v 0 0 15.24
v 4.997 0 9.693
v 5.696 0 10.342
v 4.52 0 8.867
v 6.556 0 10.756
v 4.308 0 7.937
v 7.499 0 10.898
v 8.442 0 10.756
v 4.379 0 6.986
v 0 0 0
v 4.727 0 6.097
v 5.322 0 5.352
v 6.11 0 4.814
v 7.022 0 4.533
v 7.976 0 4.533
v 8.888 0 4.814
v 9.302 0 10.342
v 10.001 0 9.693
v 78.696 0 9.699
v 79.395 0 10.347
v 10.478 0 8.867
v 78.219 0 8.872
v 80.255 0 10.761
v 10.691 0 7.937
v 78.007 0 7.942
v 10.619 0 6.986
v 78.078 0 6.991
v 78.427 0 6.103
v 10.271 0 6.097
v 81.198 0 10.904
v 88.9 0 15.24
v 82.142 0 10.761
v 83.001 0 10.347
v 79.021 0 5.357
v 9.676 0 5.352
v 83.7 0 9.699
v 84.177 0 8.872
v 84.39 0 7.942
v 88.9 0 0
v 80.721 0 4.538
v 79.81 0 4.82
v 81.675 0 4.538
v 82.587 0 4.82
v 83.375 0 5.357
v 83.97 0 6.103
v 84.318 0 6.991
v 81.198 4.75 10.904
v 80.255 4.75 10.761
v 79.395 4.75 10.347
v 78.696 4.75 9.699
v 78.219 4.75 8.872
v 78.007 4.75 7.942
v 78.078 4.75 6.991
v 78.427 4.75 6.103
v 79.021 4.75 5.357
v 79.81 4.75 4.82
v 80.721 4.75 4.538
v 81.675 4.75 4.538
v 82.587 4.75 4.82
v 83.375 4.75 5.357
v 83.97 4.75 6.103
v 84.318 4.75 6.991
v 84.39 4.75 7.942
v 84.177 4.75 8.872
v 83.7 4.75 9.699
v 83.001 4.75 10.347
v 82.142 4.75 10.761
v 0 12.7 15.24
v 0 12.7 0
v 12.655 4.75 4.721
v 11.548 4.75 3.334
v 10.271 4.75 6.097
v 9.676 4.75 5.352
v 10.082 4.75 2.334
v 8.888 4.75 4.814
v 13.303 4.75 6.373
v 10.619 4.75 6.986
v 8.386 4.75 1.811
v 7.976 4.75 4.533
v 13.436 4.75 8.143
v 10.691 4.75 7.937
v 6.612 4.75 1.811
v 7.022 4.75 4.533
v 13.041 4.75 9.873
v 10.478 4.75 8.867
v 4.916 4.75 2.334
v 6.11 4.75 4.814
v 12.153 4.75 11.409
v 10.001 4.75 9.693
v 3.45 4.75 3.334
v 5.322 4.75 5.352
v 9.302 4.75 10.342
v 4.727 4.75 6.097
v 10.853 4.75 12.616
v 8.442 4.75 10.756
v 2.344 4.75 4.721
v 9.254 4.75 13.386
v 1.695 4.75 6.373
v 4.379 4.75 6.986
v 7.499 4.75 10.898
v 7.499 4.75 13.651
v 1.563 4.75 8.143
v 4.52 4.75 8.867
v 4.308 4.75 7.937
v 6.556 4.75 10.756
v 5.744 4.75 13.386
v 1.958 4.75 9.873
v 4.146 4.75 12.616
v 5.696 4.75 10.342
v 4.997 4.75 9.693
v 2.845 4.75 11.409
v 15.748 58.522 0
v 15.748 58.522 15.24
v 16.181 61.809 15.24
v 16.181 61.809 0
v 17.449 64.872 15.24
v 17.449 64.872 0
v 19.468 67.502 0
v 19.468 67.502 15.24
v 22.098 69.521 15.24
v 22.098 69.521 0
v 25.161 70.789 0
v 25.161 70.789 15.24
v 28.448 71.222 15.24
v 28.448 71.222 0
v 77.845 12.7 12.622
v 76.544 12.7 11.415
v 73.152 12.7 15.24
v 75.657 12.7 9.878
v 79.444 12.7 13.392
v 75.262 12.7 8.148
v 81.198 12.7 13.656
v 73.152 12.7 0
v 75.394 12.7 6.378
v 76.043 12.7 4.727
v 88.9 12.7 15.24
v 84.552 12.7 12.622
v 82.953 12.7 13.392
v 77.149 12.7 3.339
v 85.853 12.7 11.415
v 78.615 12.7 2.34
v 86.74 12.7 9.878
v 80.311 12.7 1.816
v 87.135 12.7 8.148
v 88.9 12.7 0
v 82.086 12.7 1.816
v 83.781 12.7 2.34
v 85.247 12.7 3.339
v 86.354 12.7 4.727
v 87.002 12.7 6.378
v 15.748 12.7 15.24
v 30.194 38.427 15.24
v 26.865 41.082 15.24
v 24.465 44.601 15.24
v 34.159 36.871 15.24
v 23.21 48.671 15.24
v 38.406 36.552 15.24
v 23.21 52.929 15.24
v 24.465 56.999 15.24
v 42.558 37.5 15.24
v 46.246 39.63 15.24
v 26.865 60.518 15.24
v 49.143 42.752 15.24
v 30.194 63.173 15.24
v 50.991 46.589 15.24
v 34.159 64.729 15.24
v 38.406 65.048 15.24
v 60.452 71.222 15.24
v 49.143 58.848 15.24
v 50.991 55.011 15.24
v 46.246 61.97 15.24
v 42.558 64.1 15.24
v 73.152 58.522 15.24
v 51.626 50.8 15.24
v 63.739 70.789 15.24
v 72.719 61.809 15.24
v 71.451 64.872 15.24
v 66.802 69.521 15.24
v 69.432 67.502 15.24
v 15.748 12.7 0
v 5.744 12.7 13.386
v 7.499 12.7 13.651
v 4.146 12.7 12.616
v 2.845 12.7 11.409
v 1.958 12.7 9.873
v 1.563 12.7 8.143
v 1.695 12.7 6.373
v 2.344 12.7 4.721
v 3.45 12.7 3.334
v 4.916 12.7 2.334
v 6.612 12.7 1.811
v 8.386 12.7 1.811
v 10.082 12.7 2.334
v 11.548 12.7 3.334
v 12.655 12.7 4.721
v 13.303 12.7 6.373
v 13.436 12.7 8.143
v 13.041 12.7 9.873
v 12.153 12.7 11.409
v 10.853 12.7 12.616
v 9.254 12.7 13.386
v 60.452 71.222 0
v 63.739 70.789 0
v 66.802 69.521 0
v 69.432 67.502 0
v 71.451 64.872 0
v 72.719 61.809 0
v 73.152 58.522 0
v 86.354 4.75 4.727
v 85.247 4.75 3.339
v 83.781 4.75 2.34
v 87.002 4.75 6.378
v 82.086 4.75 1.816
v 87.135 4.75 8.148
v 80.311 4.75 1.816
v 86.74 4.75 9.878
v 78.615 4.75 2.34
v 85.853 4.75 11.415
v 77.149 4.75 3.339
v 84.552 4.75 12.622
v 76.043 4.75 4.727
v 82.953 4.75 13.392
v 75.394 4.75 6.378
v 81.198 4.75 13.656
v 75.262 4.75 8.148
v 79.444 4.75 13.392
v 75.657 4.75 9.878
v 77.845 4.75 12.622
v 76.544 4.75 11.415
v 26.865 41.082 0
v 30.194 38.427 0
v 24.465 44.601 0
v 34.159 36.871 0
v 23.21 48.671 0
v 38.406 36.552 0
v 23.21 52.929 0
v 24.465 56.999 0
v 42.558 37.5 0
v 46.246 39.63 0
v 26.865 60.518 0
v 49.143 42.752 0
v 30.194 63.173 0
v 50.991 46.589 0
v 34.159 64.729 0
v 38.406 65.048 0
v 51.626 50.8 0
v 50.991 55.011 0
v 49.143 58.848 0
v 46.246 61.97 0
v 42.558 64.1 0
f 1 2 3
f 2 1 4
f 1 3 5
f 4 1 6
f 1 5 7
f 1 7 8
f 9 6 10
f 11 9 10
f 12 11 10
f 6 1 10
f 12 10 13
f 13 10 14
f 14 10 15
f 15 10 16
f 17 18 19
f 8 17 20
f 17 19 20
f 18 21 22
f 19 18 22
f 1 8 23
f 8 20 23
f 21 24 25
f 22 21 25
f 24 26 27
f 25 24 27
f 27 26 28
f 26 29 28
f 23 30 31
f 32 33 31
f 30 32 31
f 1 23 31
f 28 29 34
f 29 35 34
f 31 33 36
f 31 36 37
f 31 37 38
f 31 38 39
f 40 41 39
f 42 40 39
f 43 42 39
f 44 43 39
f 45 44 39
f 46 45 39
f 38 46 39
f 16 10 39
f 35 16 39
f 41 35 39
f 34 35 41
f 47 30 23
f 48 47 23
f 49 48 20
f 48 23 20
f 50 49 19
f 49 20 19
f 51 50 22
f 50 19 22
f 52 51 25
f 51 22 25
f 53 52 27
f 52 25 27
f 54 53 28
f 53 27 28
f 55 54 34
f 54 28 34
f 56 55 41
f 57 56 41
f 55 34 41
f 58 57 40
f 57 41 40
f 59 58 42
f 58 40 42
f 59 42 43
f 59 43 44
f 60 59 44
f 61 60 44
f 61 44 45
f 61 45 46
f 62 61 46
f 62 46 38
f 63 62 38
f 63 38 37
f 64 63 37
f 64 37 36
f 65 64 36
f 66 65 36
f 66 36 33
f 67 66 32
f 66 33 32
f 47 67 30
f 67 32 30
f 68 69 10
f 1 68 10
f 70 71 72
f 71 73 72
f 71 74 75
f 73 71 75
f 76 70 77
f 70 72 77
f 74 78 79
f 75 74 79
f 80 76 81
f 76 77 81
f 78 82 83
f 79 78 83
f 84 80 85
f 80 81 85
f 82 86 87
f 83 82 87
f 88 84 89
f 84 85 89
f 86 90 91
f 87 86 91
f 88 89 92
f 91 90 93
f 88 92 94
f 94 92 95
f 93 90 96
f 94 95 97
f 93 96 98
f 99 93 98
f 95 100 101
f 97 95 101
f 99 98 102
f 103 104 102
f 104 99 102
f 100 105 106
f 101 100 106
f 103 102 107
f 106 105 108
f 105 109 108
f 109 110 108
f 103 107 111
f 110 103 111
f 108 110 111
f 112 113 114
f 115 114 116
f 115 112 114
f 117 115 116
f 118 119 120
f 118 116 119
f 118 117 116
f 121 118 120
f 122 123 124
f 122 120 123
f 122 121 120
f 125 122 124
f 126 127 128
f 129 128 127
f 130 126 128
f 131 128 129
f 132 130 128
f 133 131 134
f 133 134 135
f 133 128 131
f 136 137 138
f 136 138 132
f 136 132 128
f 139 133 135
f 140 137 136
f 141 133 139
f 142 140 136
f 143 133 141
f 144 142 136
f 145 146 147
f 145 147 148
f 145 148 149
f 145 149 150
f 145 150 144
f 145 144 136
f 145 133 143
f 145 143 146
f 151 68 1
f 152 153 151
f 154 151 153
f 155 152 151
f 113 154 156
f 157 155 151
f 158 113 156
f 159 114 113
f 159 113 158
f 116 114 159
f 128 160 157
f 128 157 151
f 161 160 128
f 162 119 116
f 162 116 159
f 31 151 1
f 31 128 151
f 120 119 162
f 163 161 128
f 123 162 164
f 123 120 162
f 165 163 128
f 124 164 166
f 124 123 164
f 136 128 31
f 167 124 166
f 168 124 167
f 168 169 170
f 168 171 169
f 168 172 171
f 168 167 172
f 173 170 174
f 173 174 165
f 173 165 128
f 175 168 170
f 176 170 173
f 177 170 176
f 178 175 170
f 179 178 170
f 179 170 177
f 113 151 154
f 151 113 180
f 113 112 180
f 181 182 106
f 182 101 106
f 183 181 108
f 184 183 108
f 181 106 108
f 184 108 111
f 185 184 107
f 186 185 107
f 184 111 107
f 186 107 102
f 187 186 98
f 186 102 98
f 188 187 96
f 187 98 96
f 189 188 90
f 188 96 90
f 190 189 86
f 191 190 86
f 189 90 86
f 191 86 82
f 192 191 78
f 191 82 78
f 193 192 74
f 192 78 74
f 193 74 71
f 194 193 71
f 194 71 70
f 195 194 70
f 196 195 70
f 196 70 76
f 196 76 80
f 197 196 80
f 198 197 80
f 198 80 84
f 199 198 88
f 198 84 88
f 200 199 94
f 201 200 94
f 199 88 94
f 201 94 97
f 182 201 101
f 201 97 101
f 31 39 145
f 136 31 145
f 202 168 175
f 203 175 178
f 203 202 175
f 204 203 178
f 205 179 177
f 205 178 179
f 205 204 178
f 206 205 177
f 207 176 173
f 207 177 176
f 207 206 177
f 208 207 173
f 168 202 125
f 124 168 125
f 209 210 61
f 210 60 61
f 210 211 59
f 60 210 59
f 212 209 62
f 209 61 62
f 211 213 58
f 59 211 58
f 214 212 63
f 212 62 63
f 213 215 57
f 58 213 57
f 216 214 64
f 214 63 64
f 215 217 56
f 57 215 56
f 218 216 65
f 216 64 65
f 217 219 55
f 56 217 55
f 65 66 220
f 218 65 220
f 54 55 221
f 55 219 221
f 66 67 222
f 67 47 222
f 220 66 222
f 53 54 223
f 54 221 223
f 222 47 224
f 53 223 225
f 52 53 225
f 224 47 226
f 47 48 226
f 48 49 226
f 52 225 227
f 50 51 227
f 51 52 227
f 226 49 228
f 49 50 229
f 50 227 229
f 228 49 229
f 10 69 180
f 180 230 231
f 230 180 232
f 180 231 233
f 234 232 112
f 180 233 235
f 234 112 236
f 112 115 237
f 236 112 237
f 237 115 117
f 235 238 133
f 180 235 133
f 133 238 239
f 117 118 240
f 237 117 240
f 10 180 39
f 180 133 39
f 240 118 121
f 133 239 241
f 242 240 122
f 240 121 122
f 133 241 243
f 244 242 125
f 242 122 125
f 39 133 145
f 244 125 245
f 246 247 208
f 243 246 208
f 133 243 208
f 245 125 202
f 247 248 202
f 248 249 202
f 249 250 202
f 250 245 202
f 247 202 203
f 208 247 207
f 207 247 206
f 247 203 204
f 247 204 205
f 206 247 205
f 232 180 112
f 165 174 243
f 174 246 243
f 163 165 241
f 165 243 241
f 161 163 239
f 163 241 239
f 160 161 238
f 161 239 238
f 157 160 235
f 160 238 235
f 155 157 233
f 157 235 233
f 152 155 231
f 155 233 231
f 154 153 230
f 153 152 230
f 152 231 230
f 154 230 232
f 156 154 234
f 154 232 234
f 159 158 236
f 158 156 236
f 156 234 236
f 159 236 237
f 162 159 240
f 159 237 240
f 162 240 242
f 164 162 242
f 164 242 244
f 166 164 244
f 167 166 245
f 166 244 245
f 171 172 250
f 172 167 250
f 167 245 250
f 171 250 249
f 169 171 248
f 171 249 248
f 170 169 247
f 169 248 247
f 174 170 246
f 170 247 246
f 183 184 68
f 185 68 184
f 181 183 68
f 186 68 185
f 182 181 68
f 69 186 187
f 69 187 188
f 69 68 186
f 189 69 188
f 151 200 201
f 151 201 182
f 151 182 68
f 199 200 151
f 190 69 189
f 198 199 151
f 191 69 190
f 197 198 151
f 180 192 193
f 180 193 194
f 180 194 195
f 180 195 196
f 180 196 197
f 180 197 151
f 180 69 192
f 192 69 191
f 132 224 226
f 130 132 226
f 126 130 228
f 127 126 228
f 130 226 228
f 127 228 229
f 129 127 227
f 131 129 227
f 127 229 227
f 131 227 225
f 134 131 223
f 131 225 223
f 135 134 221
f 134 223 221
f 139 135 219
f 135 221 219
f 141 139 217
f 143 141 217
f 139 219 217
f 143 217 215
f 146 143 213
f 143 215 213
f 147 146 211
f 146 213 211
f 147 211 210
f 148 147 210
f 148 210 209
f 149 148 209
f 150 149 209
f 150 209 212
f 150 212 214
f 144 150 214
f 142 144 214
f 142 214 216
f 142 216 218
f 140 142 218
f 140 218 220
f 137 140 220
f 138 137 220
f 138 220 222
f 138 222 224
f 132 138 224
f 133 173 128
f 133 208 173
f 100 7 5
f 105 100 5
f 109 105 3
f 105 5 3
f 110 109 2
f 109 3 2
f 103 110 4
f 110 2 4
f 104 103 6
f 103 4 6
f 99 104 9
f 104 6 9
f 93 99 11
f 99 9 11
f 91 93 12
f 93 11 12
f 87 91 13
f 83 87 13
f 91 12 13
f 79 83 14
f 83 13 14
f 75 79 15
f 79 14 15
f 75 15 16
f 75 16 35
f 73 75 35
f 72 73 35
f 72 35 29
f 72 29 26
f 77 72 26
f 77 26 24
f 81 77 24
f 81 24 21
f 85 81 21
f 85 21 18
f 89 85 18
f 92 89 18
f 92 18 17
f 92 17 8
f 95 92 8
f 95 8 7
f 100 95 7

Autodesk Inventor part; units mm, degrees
ref_plane "YZ Plane" through (0, 0, 0) normal (1, 0, 0) x (0, 1, 0)
ref_plane "XZ Plane" through (0, 0, 0) normal (0, 1, 0) x (-1, 0, 0)
ref_plane "XY Plane" through (0, 0, 0) normal (0, 0, 1) x (1, 0, 0)
sketch "Sketch1" plane through (0, 0, 0) normal (0, 0, 1) x (1, 0, 0)
  line L0 (0, 0) -> (88.9, 0)
  line L1 (88.9, 0) -> (88.9, 12.7)
  line L2 (0, 12.7) -> (0, 0)
  line L3 (0, 12.7) -> (0, 0)
  circle A0 centre (37.338, 50.8) radius 14.2875
  line L4 (0, 0) -> (0, 12.7)
  line L5 (0, 0) -> (0, 12.7)
  line L6 (0, 12.7) -> (15.748, 12.7)
  line L7 (13.208, 0) -> (0, 0)
  line L8 (15.748, 12.7) -> (0, 12.7)
  line L9 (15.748, 54.61) -> (15.748, 12.7)
  line L10 (88.9, 0) -> (62.992, 0)
  line L11 (73.152, 12.7) -> (88.9, 12.7)
  line L12 (88.9, 12.7) -> (88.9, 0)
  line L13 (73.152, 12.7) -> (73.152, 54.61)
  line L14 (60.452, 71.222) -> (28.448, 71.222)
  line L15 (15.748, 54.61) -> (15.748, 58.522)
  line L16 (73.152, 58.522) -> (73.152, 54.61)
  arc A1 (28.448, 71.222) -> (15.748, 58.522) centre (28.448, 58.522) ccw
  arc A2 (73.152, 58.522) -> (60.452, 71.222) centre (60.452, 58.522) ccw
  point P0 (65.9232, 76.2)
  point P1 (0, 12.7)
  dimension "d9" = 28.575
  dimension "d10" = 88.9
  dimension "d56" = 12.7
  dimension "d57" = 15.748
  dimension "d79" = 21.59
  dimension "d83" = 15.748
  dimension "d87" = 12.7
  dimension "d111" = 41.91
  dimension "d112" = 41.91
  dimension "d118" = 25.4
  dimension "d119" = 12.7
extrude "Extrusion7" add sketch "Sketch1" along normal blind 15.24
sketch "Sketch9" plane through (73.152, 12.7, 0) normal (0, 1, 0) x (1, 0, 0)
  point P0 (-73.152, 0)
  point P1 (8.0463, -7.7031)
hole "Hole4" at (81.1983, 12.7, 7.7031) direction (0, -1, 0) diameter 6.4008 end through all counterbore diameter 11.9062 counterbore depth 7.9502
sketch "Sketch10" plane through (0.0713, 12.7, -0.0767) normal (0, 1, 0) x (1, 0, 0)
  point P0 (-75.692, 0)
  point P1 (7.4278, -7.7745)
hole "Hole5" at (7.4991, 12.7, 7.6977) direction (0, -1, 0) diameter 6.4008 end through all counterbore diameter 11.9062 counterbore depth 7.9502
properties part number "Updated Support_chris"
